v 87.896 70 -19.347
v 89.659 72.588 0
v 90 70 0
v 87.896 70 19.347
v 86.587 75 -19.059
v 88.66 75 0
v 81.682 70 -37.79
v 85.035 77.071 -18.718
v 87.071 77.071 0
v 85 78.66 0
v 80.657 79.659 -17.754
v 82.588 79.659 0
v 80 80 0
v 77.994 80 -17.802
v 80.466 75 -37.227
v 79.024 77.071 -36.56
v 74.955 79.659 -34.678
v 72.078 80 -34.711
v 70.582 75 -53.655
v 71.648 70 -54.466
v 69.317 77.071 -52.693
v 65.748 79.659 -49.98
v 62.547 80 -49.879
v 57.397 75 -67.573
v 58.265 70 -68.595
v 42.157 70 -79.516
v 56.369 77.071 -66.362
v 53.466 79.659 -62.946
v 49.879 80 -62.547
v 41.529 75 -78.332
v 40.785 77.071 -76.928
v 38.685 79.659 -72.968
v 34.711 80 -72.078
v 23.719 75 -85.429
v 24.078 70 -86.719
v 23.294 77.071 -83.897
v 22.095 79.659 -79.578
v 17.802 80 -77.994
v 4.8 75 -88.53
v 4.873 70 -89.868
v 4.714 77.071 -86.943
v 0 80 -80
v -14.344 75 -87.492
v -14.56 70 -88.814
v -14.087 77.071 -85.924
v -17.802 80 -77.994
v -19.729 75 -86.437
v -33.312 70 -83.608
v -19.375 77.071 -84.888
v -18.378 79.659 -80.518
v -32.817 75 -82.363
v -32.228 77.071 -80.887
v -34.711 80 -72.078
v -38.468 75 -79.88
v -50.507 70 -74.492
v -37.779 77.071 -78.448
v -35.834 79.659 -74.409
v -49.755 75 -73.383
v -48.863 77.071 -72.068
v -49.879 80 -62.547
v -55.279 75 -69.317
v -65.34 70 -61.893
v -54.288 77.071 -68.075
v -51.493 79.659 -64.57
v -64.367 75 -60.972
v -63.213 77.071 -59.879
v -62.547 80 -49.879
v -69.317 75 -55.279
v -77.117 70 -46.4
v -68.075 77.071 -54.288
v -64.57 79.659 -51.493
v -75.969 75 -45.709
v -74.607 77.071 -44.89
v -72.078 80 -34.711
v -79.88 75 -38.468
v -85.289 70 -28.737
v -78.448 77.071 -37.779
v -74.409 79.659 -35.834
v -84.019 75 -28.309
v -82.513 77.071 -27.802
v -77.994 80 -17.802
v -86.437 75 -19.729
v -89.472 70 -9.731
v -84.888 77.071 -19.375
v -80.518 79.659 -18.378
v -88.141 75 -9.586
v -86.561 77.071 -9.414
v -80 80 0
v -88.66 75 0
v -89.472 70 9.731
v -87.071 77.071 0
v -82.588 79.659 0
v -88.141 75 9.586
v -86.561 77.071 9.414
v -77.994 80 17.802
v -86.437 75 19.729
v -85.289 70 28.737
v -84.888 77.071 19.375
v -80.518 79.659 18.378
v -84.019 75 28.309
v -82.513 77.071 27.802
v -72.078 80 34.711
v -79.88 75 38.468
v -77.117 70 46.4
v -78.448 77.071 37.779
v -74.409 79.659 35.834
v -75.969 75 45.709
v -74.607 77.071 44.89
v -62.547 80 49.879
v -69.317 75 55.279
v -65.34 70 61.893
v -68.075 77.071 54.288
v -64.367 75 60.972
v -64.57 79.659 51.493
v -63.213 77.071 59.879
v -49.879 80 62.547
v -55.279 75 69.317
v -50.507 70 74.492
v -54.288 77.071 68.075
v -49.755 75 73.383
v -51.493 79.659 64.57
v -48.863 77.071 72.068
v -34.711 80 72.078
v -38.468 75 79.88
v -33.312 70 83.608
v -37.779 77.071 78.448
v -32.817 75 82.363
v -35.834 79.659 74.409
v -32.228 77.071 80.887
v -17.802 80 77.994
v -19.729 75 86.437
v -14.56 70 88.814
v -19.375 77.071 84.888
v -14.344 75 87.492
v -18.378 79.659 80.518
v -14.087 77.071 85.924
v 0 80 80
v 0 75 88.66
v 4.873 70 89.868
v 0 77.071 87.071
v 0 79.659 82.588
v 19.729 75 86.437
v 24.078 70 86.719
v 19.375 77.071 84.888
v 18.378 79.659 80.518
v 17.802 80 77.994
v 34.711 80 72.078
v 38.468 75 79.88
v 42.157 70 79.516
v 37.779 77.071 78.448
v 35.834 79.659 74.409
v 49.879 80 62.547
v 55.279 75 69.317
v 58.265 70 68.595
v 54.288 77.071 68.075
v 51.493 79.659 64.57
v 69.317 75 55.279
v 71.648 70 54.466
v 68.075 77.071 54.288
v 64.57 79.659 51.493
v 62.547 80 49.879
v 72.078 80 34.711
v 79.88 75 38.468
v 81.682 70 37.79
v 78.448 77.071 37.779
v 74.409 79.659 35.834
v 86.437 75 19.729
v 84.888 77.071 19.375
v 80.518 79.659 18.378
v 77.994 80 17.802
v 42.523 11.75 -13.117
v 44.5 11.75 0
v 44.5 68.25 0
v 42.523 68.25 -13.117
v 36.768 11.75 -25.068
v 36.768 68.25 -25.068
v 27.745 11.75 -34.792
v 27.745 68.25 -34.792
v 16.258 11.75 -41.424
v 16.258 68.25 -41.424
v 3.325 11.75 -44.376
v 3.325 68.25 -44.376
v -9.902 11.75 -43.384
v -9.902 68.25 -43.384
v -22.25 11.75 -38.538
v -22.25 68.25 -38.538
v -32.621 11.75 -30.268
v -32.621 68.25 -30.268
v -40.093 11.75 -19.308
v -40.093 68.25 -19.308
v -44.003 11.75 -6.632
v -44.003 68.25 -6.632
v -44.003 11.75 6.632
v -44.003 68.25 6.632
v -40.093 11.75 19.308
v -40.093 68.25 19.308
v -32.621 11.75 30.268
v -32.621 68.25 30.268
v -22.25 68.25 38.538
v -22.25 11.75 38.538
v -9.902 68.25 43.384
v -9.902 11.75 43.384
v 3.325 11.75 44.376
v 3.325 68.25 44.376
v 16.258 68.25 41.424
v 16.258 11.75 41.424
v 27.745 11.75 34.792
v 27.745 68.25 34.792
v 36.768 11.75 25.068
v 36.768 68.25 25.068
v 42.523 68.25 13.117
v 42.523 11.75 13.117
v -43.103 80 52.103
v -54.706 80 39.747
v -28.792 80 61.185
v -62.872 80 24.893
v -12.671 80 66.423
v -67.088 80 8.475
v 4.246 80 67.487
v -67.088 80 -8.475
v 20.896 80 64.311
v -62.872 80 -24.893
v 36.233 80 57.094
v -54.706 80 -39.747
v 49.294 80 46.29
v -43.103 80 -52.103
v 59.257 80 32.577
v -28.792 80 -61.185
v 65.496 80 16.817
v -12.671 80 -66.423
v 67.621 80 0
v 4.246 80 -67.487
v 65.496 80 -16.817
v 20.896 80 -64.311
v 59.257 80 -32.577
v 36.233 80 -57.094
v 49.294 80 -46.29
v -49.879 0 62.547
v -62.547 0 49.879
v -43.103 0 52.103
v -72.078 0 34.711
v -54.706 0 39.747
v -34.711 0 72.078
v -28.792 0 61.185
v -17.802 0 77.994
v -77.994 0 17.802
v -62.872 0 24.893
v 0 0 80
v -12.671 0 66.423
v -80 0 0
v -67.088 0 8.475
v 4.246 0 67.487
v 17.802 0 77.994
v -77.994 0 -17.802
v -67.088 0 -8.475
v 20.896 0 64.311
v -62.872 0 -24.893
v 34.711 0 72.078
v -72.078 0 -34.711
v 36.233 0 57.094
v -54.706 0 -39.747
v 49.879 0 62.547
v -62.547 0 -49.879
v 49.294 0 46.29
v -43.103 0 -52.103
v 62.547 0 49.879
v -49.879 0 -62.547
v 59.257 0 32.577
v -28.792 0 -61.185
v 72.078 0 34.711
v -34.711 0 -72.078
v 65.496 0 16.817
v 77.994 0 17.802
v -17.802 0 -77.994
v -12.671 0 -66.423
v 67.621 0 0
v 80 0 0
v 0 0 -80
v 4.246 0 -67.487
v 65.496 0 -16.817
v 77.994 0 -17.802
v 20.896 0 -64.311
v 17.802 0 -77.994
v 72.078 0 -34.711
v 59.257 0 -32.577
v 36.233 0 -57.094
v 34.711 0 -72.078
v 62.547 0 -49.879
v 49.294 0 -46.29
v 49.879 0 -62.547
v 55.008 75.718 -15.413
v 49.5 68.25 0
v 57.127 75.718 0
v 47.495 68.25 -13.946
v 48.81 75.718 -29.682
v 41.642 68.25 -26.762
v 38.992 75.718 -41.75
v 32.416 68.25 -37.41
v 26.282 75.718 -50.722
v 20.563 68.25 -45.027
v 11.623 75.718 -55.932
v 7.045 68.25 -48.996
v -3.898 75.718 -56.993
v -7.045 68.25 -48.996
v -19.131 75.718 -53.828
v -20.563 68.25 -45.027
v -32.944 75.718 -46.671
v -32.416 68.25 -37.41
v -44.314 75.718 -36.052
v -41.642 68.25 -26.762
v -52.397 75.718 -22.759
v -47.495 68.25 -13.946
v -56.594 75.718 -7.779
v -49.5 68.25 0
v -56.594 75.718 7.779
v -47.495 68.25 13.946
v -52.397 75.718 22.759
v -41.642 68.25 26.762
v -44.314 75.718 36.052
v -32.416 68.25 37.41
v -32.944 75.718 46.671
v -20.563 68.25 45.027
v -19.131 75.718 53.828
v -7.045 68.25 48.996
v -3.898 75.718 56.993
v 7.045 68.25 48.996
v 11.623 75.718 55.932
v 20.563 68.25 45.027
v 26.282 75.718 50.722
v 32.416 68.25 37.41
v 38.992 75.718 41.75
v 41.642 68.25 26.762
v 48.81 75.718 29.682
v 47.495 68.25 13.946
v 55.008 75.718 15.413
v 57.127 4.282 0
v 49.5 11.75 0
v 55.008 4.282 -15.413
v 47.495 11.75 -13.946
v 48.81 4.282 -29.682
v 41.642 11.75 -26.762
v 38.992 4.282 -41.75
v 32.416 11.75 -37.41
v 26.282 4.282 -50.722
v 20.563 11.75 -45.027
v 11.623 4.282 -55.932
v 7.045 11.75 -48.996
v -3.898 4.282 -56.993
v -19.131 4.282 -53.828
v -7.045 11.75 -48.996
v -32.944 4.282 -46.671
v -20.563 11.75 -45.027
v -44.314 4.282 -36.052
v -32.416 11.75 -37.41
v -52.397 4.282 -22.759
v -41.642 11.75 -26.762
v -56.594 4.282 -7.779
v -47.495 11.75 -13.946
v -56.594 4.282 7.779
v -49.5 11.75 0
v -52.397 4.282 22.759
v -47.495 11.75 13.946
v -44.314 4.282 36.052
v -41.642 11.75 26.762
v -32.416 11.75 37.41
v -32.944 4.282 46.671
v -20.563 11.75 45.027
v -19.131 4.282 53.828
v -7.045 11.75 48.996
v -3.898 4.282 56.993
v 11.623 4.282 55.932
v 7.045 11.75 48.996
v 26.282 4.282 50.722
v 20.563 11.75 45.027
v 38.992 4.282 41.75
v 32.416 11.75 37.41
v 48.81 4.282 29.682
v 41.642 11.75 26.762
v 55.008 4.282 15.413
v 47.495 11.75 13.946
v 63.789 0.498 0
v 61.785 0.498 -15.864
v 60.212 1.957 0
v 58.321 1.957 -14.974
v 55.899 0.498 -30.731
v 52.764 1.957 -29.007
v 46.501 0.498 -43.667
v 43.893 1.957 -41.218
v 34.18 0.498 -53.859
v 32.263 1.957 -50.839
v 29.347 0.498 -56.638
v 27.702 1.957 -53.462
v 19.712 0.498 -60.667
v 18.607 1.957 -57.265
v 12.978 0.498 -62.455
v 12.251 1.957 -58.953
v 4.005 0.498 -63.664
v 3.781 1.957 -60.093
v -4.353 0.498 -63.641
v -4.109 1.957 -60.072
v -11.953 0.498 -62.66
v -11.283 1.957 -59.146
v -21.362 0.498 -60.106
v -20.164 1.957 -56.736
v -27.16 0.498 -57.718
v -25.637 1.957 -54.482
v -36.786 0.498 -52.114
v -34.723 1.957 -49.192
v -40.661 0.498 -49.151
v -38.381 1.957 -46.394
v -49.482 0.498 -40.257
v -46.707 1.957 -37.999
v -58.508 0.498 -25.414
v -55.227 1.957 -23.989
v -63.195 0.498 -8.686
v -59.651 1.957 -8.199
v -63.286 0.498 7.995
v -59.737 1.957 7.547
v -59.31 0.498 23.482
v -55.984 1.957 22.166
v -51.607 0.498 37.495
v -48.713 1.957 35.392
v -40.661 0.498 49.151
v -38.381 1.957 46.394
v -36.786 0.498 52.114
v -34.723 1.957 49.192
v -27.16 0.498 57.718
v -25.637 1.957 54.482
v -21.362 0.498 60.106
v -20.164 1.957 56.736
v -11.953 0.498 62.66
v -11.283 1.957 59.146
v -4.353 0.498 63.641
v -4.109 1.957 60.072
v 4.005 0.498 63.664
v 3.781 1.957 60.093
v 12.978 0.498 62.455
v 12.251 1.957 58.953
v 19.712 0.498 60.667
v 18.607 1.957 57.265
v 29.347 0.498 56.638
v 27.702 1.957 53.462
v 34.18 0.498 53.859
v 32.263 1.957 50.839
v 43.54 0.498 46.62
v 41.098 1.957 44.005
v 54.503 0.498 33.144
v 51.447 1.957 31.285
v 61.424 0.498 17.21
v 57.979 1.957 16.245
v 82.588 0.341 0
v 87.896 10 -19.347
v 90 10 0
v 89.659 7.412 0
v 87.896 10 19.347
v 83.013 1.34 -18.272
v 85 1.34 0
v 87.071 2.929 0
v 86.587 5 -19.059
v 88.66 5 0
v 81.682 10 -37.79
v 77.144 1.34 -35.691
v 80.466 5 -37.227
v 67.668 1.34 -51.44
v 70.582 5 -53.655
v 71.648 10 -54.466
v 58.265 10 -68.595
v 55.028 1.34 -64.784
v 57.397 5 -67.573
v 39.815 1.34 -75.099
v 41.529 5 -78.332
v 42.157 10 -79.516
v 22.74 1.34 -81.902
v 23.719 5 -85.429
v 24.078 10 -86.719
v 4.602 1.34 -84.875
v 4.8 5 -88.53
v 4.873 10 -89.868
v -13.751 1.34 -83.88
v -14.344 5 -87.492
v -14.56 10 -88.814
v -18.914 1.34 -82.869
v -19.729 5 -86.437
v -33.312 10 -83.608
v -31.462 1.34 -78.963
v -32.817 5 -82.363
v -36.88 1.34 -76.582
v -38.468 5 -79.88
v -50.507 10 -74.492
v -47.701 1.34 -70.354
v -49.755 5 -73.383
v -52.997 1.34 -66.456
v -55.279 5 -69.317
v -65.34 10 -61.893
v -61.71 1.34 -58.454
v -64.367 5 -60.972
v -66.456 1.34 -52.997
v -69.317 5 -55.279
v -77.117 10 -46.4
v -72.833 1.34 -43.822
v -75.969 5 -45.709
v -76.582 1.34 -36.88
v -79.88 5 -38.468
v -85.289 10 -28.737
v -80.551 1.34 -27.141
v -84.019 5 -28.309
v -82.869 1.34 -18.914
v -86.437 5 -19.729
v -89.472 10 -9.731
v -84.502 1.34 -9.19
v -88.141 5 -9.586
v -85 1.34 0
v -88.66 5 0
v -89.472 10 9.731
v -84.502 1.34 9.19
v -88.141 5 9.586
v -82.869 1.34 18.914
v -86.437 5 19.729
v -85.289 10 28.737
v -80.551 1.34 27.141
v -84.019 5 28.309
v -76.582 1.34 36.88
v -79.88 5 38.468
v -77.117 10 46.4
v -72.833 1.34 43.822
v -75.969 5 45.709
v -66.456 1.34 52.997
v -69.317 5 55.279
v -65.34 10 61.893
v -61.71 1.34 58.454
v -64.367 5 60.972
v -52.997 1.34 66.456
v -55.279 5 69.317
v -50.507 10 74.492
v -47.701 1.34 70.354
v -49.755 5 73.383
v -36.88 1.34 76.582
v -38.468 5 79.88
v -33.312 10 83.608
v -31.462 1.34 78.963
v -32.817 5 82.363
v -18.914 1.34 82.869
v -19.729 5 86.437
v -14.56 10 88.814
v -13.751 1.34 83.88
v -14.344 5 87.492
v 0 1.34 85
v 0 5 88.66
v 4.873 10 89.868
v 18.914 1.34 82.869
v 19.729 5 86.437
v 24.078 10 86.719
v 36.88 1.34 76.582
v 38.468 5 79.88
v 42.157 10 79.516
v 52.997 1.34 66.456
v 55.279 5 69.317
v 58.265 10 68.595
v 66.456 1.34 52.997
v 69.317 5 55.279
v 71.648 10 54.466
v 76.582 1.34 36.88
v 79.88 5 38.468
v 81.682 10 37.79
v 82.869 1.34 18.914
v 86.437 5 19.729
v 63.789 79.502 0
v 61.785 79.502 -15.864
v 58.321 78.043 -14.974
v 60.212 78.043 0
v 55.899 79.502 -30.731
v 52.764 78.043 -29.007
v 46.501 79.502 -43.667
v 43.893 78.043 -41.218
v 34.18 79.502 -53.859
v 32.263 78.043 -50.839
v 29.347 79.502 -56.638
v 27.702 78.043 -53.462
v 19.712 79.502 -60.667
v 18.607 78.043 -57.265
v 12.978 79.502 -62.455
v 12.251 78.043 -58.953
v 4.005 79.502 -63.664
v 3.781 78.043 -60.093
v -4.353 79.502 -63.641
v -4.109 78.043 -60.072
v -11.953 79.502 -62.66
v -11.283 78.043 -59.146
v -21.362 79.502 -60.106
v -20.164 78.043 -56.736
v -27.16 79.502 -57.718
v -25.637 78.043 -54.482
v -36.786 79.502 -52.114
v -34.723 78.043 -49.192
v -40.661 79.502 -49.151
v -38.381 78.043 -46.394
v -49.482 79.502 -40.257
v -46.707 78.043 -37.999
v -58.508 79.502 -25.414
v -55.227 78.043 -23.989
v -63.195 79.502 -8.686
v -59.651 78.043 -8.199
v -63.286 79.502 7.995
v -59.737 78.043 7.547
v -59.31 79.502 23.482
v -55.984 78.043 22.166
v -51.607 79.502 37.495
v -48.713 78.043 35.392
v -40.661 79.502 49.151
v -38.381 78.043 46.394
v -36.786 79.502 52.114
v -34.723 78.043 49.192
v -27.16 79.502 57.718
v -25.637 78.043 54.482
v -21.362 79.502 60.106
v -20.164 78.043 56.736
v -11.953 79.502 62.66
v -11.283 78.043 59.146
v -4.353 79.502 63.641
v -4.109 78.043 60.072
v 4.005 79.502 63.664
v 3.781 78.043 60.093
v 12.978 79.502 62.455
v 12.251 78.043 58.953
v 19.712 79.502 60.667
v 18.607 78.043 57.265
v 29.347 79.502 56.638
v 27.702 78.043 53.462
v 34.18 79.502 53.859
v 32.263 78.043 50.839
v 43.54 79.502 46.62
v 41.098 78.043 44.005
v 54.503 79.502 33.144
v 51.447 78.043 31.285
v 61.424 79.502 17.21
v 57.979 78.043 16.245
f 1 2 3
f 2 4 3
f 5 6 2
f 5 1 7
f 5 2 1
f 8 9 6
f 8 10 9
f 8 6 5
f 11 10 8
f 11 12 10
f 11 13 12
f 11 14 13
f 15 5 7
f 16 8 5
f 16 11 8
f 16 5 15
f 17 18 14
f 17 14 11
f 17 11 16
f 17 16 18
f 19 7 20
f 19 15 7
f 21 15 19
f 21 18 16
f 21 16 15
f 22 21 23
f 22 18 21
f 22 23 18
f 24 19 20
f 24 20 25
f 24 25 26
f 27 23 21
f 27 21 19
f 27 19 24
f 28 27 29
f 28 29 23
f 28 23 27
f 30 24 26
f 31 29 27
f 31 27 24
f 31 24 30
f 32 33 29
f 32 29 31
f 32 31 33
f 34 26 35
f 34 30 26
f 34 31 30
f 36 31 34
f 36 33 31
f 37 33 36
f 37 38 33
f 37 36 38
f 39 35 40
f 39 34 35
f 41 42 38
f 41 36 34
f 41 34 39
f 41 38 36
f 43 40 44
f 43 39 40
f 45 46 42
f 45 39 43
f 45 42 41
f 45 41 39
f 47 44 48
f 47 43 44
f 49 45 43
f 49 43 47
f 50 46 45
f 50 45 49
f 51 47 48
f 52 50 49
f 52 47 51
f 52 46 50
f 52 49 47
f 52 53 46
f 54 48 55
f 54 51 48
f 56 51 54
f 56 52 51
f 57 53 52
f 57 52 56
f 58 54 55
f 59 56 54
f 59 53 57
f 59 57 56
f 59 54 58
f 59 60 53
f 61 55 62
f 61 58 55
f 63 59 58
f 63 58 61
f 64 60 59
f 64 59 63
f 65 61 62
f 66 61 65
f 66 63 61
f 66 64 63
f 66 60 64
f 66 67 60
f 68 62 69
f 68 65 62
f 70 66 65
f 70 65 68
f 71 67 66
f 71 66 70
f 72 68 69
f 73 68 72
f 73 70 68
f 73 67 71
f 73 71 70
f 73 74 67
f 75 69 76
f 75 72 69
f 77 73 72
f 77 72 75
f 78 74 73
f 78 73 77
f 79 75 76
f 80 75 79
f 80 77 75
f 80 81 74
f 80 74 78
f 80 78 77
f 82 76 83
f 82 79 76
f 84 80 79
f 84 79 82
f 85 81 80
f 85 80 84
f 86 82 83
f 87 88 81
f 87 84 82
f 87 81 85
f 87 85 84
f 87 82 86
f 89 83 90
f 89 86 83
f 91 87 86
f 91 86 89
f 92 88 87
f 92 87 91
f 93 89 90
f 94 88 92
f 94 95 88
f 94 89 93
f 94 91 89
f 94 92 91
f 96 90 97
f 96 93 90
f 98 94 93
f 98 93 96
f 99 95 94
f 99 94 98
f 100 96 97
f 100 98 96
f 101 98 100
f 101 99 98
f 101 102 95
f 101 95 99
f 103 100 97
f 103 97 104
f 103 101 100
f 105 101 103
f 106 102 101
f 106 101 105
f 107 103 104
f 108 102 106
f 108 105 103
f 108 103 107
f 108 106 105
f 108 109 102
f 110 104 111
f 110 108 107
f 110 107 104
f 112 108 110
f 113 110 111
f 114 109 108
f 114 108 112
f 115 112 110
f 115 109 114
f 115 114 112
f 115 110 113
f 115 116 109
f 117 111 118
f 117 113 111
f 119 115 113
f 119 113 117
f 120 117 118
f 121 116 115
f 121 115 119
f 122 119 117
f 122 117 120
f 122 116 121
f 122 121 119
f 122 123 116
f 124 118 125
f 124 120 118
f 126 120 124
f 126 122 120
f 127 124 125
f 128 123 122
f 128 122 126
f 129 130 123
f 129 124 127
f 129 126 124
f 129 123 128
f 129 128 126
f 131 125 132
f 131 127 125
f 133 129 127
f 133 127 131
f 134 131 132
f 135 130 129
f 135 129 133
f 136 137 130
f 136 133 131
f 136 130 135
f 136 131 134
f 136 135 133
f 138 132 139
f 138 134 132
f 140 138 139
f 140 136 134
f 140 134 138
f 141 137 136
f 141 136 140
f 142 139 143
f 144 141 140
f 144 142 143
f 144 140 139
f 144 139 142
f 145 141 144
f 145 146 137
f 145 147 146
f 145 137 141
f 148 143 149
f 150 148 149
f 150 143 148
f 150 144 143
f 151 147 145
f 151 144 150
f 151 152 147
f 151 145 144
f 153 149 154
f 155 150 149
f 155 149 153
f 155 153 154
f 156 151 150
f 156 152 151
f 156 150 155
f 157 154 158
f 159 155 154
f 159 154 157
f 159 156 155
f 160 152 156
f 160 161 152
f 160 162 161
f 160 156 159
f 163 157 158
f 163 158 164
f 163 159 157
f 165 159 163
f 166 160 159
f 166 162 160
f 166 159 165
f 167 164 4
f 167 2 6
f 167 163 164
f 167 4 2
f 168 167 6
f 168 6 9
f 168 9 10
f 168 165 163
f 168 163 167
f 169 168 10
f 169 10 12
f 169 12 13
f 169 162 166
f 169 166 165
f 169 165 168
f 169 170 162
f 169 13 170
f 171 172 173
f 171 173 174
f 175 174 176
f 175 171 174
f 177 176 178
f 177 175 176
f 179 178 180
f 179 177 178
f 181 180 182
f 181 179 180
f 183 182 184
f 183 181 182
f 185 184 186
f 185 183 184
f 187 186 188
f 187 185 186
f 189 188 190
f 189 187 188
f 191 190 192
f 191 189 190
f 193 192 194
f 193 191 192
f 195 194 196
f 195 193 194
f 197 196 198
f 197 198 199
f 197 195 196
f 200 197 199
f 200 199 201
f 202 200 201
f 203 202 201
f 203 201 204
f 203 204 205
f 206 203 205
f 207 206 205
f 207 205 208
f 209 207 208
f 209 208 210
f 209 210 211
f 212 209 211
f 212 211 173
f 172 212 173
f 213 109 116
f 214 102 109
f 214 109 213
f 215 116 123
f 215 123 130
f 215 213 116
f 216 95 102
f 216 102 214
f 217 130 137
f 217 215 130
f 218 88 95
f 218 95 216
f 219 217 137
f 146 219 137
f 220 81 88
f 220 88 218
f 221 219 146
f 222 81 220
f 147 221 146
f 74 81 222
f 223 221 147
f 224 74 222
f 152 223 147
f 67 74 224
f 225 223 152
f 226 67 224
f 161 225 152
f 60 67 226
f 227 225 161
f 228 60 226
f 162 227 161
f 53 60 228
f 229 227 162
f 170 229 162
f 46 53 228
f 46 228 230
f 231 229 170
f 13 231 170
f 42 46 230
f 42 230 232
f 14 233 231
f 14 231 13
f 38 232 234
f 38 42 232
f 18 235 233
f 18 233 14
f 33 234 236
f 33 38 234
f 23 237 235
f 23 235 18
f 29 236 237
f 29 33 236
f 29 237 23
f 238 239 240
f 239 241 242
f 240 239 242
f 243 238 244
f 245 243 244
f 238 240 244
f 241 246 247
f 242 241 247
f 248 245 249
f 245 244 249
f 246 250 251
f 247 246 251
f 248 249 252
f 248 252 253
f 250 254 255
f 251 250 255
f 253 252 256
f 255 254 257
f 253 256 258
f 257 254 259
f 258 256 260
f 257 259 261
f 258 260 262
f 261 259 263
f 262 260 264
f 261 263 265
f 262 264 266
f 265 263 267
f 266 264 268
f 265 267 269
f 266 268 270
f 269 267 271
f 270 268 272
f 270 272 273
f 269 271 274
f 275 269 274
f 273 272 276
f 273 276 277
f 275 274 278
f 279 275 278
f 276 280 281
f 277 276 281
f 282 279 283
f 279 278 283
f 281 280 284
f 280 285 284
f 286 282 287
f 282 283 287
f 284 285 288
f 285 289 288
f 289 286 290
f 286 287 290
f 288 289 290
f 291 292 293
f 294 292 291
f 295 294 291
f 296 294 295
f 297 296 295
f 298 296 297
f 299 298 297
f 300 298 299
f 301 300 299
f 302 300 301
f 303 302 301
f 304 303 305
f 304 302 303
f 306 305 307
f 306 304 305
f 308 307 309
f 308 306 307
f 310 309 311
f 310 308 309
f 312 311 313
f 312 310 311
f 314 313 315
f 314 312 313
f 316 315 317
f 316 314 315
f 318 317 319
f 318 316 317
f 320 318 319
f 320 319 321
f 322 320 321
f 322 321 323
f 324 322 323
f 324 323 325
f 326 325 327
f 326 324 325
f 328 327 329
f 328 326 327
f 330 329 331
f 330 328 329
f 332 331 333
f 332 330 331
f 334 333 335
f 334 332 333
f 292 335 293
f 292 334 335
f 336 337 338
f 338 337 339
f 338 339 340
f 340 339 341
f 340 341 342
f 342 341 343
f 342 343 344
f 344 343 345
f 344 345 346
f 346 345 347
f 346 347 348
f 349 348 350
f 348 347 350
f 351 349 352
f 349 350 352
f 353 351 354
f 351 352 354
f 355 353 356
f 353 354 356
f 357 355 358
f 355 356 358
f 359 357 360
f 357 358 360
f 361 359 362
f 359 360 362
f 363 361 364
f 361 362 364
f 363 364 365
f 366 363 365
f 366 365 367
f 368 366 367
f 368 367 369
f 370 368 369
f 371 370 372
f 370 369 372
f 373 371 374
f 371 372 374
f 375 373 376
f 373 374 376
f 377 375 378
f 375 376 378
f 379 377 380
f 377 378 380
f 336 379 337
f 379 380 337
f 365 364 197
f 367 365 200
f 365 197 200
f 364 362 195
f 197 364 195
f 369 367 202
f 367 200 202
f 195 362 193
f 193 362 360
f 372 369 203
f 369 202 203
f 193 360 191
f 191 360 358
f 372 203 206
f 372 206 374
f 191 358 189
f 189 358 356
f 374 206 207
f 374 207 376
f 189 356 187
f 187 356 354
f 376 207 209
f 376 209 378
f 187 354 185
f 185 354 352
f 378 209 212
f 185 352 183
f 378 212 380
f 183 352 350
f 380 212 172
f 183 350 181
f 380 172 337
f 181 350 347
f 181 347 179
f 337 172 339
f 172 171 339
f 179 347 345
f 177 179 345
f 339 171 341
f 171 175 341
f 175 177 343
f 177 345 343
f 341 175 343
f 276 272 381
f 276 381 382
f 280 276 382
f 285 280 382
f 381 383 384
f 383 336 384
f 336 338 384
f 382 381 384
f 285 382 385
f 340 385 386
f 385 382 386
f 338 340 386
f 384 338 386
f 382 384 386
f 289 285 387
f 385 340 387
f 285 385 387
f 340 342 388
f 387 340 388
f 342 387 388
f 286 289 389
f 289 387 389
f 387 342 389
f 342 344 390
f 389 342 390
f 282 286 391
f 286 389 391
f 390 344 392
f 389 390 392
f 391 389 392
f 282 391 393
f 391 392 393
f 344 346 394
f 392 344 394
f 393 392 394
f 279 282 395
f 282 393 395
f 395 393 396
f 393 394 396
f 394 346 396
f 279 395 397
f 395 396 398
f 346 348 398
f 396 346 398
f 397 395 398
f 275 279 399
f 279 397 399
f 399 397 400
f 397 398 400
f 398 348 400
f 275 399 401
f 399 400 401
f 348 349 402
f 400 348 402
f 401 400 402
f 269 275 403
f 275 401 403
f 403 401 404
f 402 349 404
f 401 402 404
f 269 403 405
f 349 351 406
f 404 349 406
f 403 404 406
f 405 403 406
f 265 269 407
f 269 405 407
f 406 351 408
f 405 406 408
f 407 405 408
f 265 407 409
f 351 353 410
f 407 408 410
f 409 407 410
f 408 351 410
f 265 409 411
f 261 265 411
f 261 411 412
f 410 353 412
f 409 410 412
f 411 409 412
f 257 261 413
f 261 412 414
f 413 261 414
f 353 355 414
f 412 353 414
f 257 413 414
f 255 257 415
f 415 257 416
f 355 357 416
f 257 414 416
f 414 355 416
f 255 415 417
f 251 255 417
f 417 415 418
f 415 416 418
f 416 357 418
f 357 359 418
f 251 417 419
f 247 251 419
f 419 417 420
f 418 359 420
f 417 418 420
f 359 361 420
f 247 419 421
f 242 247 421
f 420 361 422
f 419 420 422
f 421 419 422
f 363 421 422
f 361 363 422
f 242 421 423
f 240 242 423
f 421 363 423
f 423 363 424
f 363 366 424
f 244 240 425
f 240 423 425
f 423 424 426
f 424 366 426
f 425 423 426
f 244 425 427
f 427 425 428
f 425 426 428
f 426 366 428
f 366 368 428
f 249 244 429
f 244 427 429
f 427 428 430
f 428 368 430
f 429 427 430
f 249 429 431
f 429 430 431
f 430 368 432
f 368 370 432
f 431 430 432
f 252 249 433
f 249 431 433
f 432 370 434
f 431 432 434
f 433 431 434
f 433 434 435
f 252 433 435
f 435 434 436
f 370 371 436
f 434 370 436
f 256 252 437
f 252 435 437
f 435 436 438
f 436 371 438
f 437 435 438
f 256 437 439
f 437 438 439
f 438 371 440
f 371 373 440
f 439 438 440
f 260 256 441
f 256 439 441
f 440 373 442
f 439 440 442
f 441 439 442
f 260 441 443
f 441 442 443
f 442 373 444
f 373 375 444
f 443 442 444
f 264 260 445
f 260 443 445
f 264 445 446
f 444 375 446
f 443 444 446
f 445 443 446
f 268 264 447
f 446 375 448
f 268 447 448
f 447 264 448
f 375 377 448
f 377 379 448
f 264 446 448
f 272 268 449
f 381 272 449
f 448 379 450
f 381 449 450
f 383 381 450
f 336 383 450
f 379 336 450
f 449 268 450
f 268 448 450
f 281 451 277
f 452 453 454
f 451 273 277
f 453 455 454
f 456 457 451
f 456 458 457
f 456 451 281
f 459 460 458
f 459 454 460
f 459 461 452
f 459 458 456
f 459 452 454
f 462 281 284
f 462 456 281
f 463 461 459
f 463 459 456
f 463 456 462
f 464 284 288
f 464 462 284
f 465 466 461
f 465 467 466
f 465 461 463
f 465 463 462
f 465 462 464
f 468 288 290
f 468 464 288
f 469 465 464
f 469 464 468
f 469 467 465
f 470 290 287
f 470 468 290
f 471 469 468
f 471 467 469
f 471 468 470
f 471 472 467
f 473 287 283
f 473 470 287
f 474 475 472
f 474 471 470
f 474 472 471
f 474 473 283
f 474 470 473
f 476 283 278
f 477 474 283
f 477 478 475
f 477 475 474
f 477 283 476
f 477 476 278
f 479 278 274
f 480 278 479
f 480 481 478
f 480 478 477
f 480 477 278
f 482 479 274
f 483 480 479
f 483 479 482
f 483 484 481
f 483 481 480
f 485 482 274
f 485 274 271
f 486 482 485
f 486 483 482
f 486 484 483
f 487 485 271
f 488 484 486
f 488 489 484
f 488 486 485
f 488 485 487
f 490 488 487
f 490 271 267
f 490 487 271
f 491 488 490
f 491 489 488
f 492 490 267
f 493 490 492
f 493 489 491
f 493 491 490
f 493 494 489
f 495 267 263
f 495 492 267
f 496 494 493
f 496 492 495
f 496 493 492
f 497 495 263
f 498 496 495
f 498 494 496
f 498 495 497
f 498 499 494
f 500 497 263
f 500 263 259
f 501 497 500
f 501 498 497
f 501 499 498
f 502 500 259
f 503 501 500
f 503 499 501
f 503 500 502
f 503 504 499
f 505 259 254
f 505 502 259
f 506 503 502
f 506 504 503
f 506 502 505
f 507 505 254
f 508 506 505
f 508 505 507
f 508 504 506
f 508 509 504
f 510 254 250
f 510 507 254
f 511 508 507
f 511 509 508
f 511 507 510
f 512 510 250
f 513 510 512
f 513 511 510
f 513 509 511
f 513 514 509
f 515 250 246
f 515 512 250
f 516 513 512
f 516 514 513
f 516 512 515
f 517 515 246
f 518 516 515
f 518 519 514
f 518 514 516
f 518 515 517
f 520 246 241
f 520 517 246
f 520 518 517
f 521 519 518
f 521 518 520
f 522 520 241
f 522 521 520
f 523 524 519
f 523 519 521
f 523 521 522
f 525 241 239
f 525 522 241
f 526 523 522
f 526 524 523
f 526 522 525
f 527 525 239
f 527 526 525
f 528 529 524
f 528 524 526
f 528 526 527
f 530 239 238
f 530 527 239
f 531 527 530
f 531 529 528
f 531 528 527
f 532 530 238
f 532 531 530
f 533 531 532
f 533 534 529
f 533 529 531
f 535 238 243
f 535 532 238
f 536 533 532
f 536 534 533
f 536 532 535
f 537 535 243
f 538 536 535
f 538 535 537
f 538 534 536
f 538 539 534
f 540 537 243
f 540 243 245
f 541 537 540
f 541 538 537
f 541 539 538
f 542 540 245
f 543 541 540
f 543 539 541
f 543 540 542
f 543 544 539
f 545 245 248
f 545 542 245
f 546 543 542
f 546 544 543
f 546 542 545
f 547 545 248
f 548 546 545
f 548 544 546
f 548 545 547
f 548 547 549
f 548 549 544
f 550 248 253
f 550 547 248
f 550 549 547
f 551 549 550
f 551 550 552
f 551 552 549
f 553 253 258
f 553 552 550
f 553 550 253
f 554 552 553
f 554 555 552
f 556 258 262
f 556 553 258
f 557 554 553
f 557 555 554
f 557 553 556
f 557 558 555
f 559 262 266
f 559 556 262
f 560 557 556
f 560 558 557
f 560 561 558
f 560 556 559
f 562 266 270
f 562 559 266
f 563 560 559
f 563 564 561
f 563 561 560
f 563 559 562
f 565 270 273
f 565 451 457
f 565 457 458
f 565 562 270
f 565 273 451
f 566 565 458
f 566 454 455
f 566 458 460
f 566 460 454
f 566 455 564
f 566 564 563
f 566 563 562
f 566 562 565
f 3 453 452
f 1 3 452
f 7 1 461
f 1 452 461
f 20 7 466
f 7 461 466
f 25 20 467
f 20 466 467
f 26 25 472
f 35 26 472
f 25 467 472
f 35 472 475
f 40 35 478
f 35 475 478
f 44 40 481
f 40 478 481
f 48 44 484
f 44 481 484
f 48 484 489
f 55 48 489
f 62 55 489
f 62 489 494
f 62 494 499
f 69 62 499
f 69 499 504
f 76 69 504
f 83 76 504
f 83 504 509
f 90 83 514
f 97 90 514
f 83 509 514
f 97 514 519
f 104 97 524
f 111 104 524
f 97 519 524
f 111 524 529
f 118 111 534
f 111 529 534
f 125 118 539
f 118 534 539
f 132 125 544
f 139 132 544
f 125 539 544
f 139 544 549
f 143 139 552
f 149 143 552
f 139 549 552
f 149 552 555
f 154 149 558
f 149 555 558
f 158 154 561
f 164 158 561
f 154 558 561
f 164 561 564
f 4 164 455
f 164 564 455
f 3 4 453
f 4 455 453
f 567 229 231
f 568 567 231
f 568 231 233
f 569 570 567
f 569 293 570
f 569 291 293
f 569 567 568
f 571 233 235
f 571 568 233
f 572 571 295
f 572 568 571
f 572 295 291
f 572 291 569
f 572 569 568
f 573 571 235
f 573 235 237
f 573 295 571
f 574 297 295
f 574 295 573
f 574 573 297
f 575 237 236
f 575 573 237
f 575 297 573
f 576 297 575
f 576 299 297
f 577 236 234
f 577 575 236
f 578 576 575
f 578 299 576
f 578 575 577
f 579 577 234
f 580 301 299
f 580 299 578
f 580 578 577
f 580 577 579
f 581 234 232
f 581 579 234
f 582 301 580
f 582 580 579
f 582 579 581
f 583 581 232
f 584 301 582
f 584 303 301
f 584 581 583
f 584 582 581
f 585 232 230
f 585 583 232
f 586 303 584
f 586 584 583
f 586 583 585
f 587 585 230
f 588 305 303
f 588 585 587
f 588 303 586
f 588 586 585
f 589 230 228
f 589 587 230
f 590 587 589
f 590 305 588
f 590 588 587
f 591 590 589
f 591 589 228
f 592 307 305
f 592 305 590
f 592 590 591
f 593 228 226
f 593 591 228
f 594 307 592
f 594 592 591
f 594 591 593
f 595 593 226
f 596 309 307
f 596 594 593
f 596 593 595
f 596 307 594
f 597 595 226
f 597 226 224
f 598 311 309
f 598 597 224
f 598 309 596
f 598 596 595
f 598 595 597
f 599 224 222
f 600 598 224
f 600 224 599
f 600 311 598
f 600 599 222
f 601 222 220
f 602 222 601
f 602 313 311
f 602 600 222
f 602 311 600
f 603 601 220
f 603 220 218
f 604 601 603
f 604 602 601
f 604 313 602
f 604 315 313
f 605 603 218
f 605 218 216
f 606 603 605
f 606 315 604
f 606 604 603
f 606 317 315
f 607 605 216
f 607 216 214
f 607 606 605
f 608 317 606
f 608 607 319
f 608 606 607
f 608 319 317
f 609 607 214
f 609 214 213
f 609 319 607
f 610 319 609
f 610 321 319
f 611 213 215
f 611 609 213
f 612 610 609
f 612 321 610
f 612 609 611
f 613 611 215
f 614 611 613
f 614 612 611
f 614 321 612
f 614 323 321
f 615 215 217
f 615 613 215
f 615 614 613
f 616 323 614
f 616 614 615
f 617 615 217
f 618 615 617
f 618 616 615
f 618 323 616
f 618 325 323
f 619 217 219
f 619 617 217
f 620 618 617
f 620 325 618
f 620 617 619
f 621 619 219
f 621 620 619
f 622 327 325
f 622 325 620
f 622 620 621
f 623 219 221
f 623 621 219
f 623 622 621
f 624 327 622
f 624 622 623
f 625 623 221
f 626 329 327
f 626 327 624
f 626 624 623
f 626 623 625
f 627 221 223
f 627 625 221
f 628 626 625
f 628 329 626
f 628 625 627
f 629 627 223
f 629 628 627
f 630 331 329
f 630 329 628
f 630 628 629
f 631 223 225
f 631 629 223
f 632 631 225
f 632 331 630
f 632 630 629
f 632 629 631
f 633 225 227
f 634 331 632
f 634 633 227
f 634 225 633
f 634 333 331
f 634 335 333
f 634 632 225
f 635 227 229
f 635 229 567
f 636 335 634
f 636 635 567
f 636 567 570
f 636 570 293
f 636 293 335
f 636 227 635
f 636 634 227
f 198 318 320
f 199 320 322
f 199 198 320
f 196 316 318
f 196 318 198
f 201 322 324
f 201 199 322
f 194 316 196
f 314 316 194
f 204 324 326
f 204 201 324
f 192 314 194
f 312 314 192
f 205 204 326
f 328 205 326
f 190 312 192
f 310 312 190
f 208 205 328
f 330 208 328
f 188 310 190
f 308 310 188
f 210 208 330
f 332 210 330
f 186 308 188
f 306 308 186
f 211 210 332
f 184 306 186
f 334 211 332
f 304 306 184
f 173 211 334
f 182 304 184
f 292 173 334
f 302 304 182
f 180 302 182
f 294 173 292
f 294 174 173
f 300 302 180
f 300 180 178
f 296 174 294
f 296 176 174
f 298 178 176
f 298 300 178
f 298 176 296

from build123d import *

# Parameters (mm, degrees)
SKETCH1_R           = 90
SKETCH1_R_2         = 44.5
BOSS_EXTRUDE1_DEPTH = 80
FILLET1_R           = 15
FILLET2_R           = 10


with BuildPart() as part:
    # Sketch1 → Boss-Extrude1 (new body)
    with BuildSketch(Plane(origin=(0, 0, 0), x_dir=(1, 0, 0), z_dir=(0, 1, 0))):
        Circle(SKETCH1_R)
        Circle(SKETCH1_R_2, mode=Mode.SUBTRACT)
    extrude(amount=BOSS_EXTRUDE1_DEPTH)

    # Sketch2 → Cut-Revolve1 (revolve, cut)
    with BuildSketch(Plane.XY):
        Polygon((61.5, 0), (49.5, 11.75), (44.5, 11.75), (44.5, 0), align=None)
    cut_revolve1 = revolve(axis=Axis((0, 0, 0), (0, 1, 0)), mode=Mode.SUBTRACT)

    # Mirror1: Cut-Revolve1 across plane
    add(cut_revolve1.mirror(Plane(origin=(0, 40, 0), x_dir=(0, 0, 1), z_dir=(0, -1, 0))), mode=Mode.SUBTRACT)

    # Fillet1
    fillet1_edges = [part.edges().sort_by_distance(p)[0] for p in [
        (-61.5, 0, 0),
        (-61.5, 80, 0),
    ]]
    fillet(fillet1_edges, radius=FILLET1_R)

    # Fillet2
    fillet2_edges = [part.edges().sort_by_distance(p)[0] for p in [
        (-90, 0, 0),
        (-90, 80, 0),
    ]]
    fillet(fillet2_edges, radius=FILLET2_R)


solid = part.part
